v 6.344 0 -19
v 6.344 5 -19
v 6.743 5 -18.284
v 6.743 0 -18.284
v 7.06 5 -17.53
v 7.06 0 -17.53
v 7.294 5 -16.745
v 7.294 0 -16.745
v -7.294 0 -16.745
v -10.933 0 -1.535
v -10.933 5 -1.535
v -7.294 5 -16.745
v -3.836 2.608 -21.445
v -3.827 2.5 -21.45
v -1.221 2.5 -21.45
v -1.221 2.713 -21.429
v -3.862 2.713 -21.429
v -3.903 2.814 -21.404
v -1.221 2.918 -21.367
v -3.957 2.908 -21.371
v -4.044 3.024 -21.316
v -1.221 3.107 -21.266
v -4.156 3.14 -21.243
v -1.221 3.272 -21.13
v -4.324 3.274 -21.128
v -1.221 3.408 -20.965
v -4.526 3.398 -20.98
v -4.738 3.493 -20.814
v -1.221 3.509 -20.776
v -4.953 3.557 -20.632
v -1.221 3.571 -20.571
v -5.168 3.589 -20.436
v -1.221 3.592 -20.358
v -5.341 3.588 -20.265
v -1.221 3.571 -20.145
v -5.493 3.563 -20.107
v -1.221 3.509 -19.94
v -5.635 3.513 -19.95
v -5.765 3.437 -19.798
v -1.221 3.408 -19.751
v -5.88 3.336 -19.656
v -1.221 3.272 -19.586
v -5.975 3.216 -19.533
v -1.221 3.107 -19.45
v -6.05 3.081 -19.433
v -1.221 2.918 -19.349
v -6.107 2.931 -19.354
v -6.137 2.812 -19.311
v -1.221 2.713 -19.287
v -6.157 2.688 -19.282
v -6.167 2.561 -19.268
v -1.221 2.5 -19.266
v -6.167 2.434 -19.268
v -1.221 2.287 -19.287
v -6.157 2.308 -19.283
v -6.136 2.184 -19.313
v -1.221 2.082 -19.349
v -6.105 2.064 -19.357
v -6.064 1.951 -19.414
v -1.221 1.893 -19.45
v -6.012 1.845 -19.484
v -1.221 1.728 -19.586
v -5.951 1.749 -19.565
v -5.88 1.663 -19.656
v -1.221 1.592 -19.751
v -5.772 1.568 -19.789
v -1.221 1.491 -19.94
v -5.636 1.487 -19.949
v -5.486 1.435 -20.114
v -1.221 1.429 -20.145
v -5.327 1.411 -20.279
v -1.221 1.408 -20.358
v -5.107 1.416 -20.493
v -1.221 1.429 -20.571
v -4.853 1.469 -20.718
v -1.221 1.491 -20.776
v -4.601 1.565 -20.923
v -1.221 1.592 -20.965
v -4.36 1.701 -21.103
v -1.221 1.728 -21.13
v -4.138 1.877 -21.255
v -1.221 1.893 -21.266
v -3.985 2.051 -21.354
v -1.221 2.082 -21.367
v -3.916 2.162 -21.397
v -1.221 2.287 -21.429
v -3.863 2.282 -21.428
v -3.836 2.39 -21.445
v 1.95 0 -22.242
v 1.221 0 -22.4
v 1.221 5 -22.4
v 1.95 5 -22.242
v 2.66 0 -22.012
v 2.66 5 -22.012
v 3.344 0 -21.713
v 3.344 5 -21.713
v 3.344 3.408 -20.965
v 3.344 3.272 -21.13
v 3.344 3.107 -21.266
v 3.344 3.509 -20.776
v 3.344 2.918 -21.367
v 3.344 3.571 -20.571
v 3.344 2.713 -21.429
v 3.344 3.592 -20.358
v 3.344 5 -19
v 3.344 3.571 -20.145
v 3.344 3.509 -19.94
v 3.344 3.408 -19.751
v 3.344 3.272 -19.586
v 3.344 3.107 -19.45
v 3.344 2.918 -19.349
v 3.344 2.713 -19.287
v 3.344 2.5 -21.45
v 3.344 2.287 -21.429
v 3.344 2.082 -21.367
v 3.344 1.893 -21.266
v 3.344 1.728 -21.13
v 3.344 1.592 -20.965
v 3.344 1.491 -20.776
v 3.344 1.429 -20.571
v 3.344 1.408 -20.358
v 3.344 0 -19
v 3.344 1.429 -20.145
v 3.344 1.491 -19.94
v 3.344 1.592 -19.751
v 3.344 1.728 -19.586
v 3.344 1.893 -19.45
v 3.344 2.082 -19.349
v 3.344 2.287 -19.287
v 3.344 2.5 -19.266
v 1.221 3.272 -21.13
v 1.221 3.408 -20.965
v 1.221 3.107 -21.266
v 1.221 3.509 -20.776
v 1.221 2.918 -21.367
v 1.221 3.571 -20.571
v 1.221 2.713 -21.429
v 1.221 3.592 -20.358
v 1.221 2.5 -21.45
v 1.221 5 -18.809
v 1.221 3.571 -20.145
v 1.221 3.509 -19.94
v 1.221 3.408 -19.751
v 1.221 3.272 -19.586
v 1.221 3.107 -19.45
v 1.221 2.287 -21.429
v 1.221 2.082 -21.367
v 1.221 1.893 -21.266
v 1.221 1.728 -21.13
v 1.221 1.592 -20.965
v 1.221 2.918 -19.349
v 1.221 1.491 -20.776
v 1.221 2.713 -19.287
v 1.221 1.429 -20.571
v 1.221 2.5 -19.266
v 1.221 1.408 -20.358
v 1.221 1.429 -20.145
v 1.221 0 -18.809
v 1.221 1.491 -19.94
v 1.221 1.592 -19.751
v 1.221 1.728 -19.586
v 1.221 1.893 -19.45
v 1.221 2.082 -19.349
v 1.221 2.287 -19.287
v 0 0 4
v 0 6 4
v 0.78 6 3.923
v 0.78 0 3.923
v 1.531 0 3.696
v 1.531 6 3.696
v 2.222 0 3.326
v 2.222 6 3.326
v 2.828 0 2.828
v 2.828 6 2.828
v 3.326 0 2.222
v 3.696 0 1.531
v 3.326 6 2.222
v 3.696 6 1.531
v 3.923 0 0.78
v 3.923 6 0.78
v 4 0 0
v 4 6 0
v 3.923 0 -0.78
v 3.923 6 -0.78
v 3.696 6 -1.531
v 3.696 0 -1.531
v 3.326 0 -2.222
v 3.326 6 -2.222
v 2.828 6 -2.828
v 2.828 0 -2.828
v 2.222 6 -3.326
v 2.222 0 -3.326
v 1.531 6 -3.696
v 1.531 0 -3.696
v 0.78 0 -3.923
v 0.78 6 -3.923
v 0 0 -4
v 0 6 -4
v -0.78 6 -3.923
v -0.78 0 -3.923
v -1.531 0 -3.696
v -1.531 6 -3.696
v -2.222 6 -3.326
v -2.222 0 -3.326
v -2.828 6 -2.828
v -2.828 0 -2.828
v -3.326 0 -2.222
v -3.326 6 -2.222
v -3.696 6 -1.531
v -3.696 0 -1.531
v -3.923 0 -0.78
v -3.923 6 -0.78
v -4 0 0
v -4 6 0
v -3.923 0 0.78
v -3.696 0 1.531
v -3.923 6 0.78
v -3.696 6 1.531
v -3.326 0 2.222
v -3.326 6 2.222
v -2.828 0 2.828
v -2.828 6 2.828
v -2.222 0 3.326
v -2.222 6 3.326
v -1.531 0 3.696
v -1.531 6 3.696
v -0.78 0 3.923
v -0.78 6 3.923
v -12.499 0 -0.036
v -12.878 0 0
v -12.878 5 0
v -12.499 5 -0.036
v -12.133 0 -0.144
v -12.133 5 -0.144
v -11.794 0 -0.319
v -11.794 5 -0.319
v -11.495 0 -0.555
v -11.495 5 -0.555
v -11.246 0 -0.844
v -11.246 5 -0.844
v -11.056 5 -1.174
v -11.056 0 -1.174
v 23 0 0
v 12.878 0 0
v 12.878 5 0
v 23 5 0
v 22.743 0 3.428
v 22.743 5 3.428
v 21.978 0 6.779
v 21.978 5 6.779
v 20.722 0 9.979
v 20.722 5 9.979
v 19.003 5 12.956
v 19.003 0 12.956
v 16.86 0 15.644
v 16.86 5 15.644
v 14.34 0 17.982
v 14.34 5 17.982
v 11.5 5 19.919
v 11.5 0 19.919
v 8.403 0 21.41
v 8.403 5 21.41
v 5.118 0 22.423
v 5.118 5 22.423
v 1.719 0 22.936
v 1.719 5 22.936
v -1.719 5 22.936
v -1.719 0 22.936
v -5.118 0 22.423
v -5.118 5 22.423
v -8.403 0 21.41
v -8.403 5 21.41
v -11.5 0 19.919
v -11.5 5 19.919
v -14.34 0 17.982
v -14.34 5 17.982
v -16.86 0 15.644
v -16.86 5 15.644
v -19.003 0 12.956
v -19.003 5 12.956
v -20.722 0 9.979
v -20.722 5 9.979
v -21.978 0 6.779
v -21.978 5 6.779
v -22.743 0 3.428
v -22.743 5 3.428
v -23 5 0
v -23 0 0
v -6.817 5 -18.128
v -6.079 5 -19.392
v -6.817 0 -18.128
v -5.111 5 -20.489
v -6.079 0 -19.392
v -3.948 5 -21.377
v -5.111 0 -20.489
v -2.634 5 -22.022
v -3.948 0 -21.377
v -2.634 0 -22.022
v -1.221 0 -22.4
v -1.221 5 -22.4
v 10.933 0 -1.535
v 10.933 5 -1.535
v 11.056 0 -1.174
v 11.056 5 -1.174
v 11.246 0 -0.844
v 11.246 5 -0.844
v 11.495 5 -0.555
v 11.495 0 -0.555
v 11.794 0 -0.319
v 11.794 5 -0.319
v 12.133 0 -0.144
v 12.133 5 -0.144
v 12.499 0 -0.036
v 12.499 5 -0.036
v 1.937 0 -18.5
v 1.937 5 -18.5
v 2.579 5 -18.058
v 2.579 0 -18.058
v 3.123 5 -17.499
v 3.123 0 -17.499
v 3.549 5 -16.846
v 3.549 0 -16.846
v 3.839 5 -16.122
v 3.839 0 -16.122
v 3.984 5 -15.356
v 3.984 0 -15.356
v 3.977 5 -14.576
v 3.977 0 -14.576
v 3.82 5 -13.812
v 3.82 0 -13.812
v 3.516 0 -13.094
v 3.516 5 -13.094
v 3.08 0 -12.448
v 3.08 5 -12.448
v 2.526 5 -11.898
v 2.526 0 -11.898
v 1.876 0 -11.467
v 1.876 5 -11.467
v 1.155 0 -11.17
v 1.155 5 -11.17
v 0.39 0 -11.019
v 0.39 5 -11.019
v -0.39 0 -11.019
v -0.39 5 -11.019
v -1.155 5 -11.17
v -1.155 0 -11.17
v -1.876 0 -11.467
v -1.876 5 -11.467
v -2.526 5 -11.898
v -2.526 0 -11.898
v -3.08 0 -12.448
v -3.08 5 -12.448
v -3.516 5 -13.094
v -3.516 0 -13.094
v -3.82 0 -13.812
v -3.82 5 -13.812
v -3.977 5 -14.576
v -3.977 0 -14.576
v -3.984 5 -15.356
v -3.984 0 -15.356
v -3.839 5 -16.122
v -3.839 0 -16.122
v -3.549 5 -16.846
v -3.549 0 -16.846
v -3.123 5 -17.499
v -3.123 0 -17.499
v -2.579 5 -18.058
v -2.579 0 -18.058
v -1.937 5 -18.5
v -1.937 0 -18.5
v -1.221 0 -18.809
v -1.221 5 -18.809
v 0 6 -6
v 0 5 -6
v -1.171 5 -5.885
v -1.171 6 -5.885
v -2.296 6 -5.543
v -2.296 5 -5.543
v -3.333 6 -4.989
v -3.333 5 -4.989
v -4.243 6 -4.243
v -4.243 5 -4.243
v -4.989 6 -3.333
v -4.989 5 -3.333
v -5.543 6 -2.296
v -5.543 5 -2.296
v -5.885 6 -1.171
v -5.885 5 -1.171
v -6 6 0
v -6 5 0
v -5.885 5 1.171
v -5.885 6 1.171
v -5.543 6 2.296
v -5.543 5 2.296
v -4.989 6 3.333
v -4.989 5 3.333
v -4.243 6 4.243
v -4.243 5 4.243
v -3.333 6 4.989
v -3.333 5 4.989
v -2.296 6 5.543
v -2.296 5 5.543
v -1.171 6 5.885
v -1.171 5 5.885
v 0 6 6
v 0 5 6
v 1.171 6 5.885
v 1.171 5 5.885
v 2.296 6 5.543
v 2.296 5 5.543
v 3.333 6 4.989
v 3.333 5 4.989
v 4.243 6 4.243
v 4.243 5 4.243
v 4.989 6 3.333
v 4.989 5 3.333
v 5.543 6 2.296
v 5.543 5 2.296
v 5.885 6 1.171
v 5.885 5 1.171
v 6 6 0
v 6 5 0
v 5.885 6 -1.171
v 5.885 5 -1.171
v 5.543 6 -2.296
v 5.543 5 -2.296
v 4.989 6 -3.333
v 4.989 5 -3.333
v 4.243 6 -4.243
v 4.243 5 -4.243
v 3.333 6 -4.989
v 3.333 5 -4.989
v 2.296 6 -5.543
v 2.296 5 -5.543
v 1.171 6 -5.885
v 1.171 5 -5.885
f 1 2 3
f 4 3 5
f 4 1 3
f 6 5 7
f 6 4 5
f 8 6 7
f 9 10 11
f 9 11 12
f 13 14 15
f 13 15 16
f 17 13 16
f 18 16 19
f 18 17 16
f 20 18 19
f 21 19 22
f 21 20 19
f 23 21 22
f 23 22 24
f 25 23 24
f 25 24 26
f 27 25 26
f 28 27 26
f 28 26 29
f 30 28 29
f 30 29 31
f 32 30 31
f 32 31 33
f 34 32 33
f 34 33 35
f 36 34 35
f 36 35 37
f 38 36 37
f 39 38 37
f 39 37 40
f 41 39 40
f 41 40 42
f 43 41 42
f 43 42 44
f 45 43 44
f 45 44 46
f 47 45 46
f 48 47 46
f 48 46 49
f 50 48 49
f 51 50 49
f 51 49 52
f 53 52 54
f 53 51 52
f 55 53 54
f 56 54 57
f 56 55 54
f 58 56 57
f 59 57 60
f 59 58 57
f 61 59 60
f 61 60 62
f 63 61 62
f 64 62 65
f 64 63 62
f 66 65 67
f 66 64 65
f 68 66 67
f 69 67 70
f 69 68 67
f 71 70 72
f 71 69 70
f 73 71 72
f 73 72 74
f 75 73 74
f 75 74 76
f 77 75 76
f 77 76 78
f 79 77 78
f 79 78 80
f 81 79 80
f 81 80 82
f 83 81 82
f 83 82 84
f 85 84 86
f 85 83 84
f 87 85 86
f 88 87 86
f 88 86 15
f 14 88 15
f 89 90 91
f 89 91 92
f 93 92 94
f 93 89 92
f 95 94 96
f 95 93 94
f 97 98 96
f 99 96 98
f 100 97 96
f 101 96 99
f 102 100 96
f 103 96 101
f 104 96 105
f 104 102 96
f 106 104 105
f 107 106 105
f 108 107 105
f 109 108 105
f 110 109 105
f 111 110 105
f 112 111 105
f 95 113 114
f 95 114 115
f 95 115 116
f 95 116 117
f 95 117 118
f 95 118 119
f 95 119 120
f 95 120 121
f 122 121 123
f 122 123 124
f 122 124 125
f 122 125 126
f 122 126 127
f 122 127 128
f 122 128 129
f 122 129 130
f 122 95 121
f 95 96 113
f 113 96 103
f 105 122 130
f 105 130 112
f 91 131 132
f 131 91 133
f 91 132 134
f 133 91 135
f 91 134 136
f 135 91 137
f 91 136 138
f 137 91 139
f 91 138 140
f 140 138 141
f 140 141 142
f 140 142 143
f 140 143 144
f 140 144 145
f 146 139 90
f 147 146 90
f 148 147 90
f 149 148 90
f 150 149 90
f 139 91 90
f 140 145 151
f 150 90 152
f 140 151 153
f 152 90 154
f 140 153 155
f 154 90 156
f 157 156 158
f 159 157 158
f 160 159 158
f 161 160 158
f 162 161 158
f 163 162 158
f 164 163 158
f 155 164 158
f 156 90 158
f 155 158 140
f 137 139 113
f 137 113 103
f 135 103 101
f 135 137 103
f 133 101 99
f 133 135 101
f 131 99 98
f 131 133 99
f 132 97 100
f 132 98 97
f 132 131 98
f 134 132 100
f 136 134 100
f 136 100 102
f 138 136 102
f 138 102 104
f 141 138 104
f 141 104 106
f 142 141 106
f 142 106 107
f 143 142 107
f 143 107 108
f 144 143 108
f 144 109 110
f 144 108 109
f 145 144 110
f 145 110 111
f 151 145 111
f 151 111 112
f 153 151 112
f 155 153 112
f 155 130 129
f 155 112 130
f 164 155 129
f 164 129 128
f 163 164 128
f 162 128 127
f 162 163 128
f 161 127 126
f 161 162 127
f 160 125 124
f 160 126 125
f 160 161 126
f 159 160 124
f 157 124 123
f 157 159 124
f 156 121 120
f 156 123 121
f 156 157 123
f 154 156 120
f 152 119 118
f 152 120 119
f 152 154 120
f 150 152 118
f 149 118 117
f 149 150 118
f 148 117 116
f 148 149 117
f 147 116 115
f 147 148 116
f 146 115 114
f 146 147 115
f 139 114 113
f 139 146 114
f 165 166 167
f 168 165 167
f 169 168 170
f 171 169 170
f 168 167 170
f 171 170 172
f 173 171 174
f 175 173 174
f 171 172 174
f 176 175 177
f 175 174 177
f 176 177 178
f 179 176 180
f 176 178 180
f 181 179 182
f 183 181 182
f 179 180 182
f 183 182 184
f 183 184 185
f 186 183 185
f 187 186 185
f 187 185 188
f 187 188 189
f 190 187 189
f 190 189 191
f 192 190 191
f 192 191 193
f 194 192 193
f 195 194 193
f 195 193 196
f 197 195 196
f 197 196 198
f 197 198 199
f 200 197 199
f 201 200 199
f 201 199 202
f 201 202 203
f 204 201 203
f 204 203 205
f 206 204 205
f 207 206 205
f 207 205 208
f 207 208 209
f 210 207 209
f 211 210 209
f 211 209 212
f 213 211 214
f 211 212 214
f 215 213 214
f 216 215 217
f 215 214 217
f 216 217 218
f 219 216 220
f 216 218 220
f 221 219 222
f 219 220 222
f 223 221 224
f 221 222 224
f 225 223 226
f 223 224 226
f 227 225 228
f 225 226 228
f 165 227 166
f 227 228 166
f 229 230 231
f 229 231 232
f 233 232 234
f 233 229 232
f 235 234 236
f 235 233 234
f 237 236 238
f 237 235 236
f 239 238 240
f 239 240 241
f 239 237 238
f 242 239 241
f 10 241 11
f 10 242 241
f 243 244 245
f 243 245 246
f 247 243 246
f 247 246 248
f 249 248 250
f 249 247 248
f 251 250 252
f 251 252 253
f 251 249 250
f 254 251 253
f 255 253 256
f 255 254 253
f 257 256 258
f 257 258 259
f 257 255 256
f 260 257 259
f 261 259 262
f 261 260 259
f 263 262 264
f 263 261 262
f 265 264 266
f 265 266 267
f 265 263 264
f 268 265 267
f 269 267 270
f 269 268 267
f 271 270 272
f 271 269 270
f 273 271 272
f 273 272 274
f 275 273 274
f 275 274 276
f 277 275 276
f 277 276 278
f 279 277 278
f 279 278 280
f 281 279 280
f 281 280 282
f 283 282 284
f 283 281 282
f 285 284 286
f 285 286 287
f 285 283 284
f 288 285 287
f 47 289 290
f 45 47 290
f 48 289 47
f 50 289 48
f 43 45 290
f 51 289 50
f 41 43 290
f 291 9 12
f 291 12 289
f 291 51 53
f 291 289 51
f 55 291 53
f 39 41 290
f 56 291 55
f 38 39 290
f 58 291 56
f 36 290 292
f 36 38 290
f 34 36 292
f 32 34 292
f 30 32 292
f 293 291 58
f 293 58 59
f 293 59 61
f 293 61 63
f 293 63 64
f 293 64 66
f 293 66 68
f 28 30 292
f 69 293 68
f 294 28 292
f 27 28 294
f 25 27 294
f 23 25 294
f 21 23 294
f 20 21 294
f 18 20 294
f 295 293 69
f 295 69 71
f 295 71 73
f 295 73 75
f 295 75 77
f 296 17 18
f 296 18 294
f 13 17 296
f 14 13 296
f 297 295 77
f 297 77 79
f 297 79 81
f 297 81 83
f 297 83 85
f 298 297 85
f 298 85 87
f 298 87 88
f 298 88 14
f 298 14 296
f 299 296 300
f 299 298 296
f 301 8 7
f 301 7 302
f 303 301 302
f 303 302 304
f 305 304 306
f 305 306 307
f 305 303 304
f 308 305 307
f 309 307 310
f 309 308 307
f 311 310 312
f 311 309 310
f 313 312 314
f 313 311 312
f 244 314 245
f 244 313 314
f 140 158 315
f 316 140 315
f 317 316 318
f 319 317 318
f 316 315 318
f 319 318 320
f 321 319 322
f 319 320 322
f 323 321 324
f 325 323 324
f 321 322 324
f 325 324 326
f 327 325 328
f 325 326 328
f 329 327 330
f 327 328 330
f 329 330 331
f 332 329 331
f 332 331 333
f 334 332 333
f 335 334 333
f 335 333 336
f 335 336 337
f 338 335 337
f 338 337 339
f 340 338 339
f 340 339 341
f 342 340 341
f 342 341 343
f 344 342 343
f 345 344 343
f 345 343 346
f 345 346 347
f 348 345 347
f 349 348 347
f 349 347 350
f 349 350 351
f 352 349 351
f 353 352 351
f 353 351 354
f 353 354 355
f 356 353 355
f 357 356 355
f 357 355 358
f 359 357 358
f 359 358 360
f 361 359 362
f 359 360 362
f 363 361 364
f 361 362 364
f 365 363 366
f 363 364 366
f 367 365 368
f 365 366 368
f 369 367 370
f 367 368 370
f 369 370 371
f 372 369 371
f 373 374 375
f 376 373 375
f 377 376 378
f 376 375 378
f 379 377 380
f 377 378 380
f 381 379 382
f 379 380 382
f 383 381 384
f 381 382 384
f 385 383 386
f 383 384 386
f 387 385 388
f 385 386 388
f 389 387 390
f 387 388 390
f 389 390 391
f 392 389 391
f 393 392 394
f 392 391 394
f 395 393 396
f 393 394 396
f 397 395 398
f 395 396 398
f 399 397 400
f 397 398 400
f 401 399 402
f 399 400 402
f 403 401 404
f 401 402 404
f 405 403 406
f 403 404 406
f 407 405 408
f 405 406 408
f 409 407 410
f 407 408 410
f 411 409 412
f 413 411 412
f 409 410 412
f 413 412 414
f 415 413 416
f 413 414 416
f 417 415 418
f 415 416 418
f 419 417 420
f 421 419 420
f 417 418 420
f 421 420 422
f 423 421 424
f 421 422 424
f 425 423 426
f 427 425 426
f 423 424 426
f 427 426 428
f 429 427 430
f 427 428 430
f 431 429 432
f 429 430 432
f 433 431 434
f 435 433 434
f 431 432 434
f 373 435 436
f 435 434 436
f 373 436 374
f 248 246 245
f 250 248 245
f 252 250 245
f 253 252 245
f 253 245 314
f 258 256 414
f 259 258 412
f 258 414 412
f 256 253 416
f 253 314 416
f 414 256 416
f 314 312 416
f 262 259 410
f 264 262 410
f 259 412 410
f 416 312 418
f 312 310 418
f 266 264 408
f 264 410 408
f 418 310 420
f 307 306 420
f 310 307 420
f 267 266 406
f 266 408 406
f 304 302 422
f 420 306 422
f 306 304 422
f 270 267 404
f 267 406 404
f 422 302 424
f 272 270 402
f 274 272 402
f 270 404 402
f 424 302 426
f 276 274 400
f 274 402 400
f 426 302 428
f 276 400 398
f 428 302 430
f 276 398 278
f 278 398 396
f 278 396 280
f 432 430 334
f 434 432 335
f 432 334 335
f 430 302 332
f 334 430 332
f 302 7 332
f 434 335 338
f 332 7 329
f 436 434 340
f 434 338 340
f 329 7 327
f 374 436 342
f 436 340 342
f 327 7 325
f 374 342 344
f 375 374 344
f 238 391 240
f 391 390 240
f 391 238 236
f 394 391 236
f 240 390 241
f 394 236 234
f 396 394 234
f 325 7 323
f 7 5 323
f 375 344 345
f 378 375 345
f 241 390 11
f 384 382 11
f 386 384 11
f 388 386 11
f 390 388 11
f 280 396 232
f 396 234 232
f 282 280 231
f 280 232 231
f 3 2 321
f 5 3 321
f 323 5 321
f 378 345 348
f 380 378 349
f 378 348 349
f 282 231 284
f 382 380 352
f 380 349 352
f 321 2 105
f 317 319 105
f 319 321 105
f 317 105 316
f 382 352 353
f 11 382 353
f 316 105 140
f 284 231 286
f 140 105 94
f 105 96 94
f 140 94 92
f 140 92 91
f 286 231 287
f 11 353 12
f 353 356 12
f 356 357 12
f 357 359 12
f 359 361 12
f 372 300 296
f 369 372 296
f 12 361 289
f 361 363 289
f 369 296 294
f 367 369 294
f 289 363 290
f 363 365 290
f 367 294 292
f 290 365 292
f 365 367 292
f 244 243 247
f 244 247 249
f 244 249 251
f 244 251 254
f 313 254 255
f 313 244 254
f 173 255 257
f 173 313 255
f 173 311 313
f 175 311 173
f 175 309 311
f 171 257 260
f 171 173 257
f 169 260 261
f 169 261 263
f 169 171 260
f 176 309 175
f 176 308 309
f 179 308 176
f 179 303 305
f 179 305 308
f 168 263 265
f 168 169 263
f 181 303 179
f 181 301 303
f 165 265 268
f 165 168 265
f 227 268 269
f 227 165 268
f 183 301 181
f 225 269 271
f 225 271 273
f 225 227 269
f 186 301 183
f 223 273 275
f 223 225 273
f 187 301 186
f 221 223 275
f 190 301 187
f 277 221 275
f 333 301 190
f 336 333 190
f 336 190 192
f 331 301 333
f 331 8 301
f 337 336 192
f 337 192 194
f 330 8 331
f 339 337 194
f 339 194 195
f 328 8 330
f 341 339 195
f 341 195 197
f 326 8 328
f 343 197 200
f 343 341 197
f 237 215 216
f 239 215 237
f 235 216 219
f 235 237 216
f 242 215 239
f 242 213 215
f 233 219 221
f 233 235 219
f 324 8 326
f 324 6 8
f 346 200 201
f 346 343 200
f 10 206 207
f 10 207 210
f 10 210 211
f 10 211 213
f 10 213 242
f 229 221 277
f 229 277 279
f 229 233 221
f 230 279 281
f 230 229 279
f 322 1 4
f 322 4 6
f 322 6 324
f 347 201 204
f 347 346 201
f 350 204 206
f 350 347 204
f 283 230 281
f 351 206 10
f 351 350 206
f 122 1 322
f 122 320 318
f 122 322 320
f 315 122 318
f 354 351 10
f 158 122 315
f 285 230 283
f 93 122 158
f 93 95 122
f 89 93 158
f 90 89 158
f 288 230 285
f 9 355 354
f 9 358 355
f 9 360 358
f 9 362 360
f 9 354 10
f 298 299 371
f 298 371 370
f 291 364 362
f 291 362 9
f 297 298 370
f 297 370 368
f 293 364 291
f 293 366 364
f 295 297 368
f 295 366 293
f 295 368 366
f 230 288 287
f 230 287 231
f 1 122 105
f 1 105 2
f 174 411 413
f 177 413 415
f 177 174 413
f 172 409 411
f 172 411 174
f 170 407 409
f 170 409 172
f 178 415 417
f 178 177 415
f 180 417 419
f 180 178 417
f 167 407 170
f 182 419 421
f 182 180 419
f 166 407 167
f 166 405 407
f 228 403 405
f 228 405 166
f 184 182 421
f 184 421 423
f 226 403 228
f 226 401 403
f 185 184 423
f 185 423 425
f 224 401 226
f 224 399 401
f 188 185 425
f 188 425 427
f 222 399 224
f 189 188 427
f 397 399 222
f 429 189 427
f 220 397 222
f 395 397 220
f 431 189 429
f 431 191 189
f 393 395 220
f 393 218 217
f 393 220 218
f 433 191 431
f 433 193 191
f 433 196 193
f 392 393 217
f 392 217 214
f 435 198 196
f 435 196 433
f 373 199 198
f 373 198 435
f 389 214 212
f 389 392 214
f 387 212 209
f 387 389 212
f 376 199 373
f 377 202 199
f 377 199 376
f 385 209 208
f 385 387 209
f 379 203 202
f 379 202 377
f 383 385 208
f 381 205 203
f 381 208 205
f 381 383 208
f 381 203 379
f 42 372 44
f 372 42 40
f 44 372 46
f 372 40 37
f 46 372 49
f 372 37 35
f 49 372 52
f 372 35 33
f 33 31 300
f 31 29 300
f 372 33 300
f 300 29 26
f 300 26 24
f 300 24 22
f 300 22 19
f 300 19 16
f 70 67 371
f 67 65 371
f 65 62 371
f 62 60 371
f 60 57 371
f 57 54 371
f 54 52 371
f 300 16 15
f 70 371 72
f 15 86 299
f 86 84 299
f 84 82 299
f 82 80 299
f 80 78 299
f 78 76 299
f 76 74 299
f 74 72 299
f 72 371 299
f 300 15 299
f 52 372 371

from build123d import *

# Parameters (mm, degrees)
BOSS_EXTRUDE1_DEPTH     = 5
SKETCH2_R               = 6
BOSS_EXTRUDE2_DEPTH     = 1
SKETCH3_R               = 4
CUT_EXTRUDE1_DEPTH      = 34.075670817
CUT_EXTRUDE2_START      = -10
CUT_EXTRUDE2_DEPTH      = 10
CUT_EXTRUDE3_START      = -10
CUT_EXTRUDE3_DEPTH      = 10
CUT_EXTRUDE4_DEPTH      = 34.075670817
CUT_EXTRUDE4_DEPTH_BACK = 34.075670817
SKETCH7_R               = 1.0922


with BuildPart() as part:
    # Sketch1 → Boss-Extrude1 (new body)
    with BuildSketch(Plane(origin=(0, 0, 0), x_dir=(1, 0, 0), z_dir=(0, 1, 0))):
        with BuildLine():
            Line((-23, 0), (-12.87798214, 0))
            ThreePointArc((-12.87798214, 0), (-11.639160434, 0.429865999), (-10.932866059, 1.534679219))
            Line((-10.932866059, 1.534679219), (-7.294185306, 16.74495293))
            ThreePointArc((-7.294185306, 16.74495293), (0, 22.5), (7.294185306, 16.74495293))
            Line((7.294185306, 16.74495293), (10.932866059, 1.534679219))
            ThreePointArc((10.932866059, 1.534679219), (11.639160434, 0.429865999), (12.87798214, 0))
            Line((12.87798214, 0), (23, 0))
            ThreePointArc((23, 0), (0, -23), (-23, 0))
        make_face()
    extrude(amount=BOSS_EXTRUDE1_DEPTH)

    # Sketch2 → Boss-Extrude2 (add)
    with BuildSketch(Plane(origin=(0, 5, 0), x_dir=(1, 0, 0), z_dir=(0, 1, 0))):
        with Locations(Location((0, 0, 0), (0, 0, 90))):
            Circle(SKETCH2_R)
    extrude(amount=BOSS_EXTRUDE2_DEPTH)

    # Sketch3 → Cut-Extrude1 (cut, through all)
    with BuildSketch(Plane(origin=(0, 6, 0), x_dir=(1, 0, 0), z_dir=(0, 1, 0))):
        with Locations(Location((0, 0, 0), (0, 0, 270))):
            Circle(SKETCH3_R)
    extrude(amount=-CUT_EXTRUDE1_DEPTH, mode=Mode.SUBTRACT)

    # Sketch4 → Cut-Extrude2 (cut)
    with BuildSketch(Plane(origin=(0, 5, 0), x_dir=(1, 0, 0), z_dir=(0, 1, 0)).offset(CUT_EXTRUDE2_START)):
        with BuildLine():
            Line((-1.220655562, 18.809199391), (-1.220655562, 22.4))
            ThreePointArc((-1.220655562, 22.4), (0, 22.5), (1.220655562, 22.4))
            Line((1.220655562, 22.4), (1.220655562, 18.809199391))
            ThreePointArc((1.220655562, 18.809199391), (0, 11), (-1.220655562, 18.809199391))
        make_face()
    extrude(amount=CUT_EXTRUDE2_DEPTH, mode=Mode.SUBTRACT)

    # Sketch5 → Cut-Extrude3 (cut)
    with BuildSketch(Plane(origin=(0, 5, 0), x_dir=(1, 0, 0), z_dir=(0, 1, 0)).offset(CUT_EXTRUDE3_START)):
        with BuildLine():
            Line((3.34428877, 19), (6.34428877, 19))
            ThreePointArc((6.34428877, 19), (5.030642475, 20.562610564), (3.34428877, 21.713101565))
            Line((3.34428877, 21.713101565), (3.34428877, 19))
        make_face()
    extrude(amount=CUT_EXTRUDE3_DEPTH, mode=Mode.SUBTRACT)

    # Sketch7 → Cut-Extrude4 (cut, two sides: drawn at the far end of the back side and taken through both)
    with BuildSketch(Plane(origin=(0, 0, 0), x_dir=(0, 0, -1), z_dir=(1, 0, 0)).offset(-CUT_EXTRUDE4_DEPTH_BACK)):
        with Locations((20.358101565, 2.5)):
            Circle(SKETCH7_R)
    extrude(amount=CUT_EXTRUDE4_DEPTH + CUT_EXTRUDE4_DEPTH_BACK, mode=Mode.SUBTRACT)


solid = part.part
